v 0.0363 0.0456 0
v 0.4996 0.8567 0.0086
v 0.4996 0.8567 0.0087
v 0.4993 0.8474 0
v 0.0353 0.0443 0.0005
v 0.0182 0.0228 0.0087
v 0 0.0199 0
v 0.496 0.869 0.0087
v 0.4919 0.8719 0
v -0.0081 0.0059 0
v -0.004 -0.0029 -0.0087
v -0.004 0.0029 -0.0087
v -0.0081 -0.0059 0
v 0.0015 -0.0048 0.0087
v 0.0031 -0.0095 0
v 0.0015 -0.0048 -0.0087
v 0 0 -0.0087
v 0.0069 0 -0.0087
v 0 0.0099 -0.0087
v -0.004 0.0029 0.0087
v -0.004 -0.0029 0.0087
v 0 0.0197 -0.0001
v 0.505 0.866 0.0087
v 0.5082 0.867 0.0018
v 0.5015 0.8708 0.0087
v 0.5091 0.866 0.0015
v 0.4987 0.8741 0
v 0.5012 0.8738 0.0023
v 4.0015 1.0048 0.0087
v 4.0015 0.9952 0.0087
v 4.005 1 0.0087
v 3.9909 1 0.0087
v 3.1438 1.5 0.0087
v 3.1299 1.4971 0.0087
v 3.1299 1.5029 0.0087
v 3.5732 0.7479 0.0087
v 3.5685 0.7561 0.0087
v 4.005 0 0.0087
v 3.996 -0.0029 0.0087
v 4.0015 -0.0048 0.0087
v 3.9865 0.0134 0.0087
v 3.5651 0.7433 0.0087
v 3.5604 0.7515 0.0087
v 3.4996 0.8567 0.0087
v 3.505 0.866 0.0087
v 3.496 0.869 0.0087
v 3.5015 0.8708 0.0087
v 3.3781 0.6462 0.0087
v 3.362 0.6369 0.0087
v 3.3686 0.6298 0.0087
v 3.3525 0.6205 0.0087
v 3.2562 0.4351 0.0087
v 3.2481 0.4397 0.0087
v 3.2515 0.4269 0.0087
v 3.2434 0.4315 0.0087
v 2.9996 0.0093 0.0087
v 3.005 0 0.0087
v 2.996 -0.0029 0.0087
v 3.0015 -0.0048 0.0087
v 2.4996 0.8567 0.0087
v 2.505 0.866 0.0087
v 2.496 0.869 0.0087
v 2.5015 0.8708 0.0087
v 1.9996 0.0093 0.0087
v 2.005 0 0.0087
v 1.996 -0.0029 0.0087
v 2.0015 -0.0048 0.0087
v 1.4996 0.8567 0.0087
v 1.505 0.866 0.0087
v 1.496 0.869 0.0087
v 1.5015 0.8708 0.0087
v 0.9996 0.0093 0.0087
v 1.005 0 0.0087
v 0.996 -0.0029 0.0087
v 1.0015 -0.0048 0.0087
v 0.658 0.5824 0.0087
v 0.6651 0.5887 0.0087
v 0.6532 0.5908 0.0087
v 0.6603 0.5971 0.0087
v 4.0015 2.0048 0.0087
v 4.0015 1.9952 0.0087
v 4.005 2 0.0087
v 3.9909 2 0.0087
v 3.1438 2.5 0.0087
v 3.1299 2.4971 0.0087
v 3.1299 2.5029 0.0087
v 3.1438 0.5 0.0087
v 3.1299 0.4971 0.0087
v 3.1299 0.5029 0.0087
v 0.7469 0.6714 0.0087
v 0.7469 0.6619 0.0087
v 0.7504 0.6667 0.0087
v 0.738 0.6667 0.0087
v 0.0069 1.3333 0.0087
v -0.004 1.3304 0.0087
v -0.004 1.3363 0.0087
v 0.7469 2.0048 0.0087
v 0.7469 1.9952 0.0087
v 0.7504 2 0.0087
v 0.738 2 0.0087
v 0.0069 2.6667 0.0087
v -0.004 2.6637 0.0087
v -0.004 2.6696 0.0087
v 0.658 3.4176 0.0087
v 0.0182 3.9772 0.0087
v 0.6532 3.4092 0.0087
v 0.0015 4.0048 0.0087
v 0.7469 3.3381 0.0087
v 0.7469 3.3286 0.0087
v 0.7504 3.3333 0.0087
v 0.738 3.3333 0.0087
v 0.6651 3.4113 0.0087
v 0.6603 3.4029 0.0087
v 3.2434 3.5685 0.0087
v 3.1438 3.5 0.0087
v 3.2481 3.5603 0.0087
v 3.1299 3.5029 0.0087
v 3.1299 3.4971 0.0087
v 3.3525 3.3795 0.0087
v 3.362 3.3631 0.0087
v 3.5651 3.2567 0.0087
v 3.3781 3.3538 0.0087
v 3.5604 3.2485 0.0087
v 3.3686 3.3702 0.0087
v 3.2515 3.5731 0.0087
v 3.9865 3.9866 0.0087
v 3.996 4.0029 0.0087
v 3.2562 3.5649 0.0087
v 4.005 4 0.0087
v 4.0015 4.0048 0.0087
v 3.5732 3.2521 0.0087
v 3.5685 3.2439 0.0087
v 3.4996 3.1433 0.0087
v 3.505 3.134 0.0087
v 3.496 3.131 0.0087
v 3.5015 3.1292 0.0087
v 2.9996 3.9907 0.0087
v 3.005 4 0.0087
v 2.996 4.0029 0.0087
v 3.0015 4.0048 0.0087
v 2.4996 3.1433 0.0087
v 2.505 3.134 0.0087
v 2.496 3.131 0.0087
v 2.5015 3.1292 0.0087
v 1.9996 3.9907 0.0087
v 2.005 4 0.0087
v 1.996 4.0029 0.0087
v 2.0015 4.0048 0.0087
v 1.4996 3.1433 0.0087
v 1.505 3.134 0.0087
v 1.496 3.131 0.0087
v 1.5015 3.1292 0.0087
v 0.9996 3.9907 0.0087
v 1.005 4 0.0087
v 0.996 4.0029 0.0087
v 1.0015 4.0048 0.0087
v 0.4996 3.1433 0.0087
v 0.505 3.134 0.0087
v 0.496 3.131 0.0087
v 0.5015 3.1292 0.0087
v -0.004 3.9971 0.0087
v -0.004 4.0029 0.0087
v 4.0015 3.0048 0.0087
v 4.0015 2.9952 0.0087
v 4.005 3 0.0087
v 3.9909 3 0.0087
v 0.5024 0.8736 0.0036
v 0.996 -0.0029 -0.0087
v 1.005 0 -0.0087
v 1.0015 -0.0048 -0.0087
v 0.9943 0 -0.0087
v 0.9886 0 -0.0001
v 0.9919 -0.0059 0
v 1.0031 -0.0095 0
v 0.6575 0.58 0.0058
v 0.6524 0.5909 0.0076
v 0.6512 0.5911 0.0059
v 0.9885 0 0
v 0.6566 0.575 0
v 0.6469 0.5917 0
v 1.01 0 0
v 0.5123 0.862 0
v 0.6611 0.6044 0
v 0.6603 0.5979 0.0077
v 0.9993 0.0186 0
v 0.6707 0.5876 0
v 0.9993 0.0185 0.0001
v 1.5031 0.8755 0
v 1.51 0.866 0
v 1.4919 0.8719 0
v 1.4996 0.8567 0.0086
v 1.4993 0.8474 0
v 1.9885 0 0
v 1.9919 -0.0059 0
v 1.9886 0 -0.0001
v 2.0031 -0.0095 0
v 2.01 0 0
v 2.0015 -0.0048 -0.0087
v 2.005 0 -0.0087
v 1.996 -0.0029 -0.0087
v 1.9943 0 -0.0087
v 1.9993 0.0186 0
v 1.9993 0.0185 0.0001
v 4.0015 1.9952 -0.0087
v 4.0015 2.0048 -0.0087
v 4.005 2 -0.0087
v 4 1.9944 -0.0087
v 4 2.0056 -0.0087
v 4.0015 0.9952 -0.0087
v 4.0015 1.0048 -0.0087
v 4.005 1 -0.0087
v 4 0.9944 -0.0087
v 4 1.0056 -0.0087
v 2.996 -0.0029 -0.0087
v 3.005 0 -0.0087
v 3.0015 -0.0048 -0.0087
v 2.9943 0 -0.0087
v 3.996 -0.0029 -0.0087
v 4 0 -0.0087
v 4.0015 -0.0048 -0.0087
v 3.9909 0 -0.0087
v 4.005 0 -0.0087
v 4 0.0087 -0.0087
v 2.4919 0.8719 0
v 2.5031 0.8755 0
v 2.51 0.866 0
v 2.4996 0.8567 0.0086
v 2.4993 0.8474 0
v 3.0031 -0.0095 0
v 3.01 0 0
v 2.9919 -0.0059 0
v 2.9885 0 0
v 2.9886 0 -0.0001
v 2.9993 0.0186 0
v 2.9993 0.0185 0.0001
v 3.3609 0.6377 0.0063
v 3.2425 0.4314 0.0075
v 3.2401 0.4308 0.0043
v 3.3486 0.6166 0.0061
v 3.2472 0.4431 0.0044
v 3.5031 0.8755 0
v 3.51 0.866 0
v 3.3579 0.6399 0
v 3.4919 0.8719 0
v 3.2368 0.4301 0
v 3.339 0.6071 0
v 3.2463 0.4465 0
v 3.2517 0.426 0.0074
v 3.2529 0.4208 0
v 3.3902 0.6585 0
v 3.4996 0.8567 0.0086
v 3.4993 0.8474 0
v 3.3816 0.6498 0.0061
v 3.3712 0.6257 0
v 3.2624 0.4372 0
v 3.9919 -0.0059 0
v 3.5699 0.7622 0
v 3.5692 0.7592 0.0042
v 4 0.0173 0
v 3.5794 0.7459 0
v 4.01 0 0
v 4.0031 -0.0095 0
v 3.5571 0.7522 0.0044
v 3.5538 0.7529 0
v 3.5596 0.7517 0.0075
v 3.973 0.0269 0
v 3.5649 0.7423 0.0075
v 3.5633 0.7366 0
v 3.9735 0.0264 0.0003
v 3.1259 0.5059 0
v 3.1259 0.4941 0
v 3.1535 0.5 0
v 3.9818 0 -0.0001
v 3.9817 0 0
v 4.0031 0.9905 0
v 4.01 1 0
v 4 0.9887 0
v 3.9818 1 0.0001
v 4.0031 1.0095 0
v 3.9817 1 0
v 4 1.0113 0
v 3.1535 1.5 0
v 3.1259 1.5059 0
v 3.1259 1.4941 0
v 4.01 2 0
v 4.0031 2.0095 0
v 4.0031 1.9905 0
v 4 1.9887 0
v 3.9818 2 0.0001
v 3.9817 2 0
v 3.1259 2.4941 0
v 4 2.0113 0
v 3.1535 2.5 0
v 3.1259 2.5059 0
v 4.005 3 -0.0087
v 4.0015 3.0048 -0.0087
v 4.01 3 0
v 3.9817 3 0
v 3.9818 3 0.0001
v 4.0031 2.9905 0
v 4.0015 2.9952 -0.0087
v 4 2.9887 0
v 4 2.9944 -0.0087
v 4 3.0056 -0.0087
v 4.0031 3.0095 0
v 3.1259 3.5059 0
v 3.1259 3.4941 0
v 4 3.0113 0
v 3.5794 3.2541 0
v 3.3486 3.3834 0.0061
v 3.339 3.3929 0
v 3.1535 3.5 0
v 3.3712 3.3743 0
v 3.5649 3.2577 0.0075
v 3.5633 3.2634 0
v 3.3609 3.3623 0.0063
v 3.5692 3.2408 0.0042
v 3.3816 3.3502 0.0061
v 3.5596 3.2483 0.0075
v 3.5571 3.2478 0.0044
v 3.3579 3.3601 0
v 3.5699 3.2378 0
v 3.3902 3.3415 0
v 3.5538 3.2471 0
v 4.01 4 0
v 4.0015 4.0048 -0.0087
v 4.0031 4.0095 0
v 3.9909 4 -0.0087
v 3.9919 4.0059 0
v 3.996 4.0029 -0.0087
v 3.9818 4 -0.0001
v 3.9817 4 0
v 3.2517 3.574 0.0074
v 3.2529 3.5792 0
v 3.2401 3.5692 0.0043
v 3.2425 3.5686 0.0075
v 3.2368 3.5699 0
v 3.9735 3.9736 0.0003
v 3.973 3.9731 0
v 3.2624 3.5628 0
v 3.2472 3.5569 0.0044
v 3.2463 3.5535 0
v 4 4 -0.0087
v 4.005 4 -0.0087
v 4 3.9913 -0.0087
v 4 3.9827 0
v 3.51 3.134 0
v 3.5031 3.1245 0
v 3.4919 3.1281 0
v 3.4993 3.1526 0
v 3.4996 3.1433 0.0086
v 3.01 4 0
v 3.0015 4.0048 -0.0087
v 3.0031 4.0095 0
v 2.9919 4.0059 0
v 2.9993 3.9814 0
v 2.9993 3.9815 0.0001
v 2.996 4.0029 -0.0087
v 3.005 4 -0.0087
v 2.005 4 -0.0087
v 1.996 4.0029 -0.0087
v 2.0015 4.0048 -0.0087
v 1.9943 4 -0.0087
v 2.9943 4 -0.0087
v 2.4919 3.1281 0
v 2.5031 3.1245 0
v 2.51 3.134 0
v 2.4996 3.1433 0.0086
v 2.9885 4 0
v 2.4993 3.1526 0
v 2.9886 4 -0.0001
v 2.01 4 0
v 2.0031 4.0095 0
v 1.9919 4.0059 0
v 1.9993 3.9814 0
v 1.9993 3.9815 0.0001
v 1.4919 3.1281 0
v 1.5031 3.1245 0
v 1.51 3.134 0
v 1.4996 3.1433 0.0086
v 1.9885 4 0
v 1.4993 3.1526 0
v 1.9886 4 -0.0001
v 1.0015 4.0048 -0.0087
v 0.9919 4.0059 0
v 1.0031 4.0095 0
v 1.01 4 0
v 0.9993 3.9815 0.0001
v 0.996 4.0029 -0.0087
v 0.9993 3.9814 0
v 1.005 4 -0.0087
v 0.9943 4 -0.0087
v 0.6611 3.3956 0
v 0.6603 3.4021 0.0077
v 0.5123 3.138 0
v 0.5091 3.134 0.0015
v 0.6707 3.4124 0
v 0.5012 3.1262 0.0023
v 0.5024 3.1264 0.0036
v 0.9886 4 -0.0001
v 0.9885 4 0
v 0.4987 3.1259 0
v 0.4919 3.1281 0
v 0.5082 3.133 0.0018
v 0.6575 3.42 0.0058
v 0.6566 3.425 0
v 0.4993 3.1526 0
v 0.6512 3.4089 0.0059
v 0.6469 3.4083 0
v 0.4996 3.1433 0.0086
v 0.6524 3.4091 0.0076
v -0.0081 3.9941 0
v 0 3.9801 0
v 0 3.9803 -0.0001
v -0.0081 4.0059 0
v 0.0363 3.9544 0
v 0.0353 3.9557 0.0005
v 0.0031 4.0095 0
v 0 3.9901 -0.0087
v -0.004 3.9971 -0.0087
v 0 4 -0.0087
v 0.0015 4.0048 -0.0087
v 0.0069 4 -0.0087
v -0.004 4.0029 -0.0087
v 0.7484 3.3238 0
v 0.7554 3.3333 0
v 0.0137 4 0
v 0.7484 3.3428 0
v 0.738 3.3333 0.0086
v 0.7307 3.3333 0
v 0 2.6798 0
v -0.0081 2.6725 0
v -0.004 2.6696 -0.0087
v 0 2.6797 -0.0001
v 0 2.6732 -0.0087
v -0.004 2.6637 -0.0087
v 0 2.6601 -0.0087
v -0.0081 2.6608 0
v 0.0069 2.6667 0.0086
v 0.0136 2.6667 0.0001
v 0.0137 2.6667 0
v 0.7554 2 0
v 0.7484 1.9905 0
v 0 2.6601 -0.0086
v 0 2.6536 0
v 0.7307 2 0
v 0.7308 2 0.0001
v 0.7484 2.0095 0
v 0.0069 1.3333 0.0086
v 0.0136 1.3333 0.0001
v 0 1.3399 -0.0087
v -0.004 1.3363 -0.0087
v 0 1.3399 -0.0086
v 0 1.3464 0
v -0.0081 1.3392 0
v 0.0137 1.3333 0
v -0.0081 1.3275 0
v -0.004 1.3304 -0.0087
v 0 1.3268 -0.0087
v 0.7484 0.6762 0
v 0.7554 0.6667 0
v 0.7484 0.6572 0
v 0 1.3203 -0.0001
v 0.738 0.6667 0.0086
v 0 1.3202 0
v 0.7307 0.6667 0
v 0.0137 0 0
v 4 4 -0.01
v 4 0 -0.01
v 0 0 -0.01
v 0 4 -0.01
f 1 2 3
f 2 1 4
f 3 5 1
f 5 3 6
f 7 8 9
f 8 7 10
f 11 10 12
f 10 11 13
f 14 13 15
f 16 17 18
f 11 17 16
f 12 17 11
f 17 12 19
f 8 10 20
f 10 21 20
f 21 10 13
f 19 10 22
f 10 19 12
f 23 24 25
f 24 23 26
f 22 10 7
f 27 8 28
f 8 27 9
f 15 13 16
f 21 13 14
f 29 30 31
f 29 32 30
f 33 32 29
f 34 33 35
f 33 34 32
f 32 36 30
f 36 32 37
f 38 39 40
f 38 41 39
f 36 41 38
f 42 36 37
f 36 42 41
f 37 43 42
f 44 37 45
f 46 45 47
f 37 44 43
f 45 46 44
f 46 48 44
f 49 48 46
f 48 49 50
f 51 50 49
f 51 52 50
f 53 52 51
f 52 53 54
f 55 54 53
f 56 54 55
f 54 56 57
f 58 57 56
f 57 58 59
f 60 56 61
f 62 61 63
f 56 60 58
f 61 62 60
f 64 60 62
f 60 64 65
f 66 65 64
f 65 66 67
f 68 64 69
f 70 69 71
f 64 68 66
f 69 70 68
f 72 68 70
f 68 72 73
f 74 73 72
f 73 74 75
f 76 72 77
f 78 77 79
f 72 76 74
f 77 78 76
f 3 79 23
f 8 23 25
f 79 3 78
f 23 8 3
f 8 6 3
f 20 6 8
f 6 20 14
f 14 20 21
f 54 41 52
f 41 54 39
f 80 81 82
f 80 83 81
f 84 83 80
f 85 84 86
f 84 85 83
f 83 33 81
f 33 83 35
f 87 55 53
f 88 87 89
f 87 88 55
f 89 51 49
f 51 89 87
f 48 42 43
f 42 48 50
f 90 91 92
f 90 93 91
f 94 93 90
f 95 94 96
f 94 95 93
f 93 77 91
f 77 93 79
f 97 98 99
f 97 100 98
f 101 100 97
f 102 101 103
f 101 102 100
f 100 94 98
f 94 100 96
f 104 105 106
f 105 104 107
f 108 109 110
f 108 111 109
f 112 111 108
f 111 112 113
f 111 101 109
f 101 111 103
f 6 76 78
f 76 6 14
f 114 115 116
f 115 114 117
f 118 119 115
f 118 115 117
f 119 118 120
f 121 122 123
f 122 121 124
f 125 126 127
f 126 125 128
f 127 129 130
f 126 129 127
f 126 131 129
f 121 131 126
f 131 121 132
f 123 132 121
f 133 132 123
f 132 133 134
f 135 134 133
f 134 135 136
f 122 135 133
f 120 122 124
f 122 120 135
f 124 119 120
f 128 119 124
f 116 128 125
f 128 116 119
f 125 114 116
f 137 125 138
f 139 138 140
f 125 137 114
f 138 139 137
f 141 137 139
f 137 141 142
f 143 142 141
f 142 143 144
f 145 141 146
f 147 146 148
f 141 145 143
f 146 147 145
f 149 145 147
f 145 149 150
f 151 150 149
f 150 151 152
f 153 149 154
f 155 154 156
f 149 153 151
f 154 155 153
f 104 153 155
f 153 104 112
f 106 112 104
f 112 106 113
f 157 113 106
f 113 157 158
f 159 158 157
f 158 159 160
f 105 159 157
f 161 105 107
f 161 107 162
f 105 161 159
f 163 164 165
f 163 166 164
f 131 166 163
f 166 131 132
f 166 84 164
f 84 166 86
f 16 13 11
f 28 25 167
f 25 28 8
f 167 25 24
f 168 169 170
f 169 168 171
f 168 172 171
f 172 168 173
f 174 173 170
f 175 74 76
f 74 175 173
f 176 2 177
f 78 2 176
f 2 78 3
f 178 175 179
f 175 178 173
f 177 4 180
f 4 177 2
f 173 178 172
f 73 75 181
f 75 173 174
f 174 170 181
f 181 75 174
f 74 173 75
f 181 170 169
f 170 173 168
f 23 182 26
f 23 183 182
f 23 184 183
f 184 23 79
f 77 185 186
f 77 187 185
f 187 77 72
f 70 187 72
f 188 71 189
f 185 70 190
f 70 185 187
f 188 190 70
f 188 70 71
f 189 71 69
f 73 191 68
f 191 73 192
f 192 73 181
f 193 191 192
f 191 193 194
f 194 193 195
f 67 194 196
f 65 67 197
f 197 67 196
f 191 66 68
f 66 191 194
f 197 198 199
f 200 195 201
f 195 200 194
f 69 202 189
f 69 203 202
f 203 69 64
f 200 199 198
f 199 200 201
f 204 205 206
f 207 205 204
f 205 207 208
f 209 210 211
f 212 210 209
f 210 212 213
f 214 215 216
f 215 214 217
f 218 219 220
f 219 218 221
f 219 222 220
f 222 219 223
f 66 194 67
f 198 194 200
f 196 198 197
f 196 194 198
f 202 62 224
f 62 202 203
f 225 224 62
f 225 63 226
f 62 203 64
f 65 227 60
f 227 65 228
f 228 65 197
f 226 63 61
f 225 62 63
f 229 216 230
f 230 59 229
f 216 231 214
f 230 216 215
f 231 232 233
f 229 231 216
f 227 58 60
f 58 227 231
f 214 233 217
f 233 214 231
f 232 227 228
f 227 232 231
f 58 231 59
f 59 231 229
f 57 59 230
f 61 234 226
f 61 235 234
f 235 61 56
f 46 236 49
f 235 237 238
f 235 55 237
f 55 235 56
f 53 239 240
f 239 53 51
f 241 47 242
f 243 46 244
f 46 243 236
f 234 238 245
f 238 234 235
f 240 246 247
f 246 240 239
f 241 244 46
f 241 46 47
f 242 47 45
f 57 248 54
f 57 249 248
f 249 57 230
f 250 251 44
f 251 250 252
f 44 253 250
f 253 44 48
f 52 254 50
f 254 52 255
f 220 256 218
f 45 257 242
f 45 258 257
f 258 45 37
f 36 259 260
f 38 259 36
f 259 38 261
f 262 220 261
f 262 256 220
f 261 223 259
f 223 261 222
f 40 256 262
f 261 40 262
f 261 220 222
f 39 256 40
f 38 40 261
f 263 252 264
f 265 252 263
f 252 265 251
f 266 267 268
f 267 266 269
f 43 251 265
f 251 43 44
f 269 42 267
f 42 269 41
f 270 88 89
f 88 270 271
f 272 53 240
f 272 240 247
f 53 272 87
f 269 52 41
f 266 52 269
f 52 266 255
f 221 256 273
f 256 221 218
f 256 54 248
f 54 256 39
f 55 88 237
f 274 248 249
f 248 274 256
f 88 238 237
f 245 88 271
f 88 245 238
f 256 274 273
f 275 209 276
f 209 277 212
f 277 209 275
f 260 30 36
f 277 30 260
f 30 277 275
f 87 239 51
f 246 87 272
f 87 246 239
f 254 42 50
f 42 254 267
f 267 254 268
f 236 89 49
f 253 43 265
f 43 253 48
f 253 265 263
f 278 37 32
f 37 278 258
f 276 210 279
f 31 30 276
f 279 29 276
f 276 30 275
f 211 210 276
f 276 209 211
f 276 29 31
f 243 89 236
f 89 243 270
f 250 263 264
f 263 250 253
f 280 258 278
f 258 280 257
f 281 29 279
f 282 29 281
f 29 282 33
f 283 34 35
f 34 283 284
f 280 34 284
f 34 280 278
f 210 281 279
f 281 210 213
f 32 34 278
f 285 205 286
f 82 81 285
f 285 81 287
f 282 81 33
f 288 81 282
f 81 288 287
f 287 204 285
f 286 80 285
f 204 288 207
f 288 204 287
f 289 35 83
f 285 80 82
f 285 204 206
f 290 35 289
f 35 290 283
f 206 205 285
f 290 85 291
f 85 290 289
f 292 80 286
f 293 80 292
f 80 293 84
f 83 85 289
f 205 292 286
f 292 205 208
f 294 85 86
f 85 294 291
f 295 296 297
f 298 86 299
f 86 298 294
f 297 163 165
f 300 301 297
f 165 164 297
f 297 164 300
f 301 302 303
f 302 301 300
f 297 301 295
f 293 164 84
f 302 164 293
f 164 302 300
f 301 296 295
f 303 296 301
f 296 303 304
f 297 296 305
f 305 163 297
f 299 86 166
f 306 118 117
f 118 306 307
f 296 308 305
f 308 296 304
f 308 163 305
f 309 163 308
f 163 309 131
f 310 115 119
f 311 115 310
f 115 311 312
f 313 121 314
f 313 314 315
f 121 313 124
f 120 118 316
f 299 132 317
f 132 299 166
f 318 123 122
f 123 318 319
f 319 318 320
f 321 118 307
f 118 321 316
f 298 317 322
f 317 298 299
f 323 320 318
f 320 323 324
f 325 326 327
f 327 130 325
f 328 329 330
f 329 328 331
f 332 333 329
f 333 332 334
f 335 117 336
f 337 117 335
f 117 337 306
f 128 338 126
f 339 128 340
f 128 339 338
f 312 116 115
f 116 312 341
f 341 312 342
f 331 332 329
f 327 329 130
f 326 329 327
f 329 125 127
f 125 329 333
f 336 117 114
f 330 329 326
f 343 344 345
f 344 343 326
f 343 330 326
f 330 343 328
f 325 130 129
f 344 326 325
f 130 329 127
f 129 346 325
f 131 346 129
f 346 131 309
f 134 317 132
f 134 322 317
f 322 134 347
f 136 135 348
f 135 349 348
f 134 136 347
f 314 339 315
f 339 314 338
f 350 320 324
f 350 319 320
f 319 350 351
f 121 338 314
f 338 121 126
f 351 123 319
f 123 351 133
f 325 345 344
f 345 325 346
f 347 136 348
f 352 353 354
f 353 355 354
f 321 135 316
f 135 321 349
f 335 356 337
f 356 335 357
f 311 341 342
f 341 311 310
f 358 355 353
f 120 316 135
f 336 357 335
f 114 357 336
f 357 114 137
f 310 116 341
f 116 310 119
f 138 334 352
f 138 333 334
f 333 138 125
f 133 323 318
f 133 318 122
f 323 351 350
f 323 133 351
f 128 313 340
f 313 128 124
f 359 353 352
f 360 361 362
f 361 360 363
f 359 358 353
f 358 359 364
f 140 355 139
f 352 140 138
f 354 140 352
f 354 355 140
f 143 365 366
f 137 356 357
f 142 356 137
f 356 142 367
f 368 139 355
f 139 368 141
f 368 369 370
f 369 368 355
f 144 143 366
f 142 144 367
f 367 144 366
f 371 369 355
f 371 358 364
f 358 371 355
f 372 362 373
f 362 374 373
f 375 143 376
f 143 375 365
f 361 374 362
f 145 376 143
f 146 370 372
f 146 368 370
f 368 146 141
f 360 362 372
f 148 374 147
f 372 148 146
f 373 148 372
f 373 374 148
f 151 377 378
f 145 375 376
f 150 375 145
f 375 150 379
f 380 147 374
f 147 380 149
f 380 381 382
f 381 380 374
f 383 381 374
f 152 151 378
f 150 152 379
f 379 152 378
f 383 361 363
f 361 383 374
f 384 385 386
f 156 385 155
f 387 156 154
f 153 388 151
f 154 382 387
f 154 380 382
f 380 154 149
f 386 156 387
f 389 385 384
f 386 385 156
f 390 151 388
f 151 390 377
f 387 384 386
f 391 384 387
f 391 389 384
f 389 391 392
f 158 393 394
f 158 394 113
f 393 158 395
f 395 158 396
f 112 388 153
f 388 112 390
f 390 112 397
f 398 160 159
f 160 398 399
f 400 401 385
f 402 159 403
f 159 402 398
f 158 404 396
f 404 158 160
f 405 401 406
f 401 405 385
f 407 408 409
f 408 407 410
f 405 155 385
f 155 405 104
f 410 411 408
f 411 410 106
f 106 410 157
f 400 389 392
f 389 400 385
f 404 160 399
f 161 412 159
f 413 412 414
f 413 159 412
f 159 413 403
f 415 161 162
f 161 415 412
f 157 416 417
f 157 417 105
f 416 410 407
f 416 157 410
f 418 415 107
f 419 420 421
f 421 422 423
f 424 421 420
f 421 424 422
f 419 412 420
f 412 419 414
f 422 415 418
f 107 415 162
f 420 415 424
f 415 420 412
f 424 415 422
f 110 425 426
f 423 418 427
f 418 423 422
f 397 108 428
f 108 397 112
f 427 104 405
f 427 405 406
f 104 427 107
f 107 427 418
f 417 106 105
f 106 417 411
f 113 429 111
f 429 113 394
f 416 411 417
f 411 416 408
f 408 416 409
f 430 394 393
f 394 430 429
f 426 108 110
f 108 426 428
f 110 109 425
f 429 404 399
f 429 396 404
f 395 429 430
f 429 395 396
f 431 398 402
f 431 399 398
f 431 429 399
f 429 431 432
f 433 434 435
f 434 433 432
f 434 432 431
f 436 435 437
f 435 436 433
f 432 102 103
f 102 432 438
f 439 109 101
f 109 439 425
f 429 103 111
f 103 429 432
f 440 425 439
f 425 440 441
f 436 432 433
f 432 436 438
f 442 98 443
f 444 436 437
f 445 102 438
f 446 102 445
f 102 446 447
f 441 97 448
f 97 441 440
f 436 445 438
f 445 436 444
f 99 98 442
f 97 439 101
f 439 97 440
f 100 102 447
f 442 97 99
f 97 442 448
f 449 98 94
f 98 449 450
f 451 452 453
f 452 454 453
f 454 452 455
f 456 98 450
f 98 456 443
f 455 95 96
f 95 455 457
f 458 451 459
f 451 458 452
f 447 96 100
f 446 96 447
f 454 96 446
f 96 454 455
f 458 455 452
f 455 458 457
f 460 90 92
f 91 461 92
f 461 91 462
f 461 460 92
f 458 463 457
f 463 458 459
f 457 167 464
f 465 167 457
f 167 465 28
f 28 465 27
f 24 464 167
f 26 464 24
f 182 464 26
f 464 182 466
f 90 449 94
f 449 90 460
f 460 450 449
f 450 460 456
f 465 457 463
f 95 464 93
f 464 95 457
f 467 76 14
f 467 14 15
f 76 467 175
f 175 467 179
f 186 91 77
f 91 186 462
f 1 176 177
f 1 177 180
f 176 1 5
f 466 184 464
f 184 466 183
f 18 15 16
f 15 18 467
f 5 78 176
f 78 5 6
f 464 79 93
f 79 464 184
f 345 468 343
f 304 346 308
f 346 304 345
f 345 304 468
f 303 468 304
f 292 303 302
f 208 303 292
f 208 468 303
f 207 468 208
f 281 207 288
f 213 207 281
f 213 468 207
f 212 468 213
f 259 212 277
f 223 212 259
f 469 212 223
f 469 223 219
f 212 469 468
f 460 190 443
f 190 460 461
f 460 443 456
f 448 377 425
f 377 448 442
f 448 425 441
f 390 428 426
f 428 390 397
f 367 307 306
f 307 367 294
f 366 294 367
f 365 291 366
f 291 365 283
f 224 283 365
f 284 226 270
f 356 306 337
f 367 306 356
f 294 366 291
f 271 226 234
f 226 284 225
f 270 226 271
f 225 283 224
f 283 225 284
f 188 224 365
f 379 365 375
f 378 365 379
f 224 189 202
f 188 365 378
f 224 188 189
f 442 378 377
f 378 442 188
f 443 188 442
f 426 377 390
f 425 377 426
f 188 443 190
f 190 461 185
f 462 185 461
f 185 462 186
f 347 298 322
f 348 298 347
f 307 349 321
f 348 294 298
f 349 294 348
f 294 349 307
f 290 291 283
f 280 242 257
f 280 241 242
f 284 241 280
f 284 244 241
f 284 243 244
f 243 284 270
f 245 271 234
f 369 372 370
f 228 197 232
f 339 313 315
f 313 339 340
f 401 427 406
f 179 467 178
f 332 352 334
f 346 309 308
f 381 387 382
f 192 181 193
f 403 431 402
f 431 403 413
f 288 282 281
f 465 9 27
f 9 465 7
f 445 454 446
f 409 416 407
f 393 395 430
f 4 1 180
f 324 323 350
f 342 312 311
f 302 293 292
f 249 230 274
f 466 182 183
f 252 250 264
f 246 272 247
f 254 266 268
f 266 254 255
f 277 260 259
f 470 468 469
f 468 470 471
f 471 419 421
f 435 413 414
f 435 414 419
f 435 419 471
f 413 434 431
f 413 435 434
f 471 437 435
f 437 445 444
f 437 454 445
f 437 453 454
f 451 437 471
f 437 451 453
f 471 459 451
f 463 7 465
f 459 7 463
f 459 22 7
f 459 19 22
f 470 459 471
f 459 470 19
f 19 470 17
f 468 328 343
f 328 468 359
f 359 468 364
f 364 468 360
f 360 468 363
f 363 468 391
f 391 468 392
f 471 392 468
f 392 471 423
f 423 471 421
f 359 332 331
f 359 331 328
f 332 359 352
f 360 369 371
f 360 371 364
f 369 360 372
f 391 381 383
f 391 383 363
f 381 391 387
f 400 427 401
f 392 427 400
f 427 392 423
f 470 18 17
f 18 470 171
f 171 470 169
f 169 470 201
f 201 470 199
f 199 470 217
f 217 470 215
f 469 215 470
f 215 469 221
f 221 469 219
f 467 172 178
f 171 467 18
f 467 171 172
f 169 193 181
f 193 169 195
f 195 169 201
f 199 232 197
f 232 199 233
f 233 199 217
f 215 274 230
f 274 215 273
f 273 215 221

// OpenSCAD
hull(){
    translate([0.0, 0.0]) sphere(0.01);
    translate([0.5, 0.8660254038]) sphere(0.01);
}
hull(){
    translate([0.5, 0.8660254038]) sphere(0.01);
    translate([1.0, 0.0]) sphere(0.01);
}
hull(){
    translate([1.0, 0.0]) sphere(0.01);
    translate([1.5, 0.8660254038]) sphere(0.01);
}
hull(){
    translate([1.5, 0.8660254038]) sphere(0.01);
    translate([2.0, 0.0]) sphere(0.01);
}
hull(){
    translate([2.0, 0.0]) sphere(0.01);
    translate([2.5, 0.8660254038]) sphere(0.01);
}
hull(){
    translate([2.5, 0.8660254038]) sphere(0.01);
    translate([3.0, 0.0]) sphere(0.01);
}
hull(){
    translate([3.0, 0.0]) sphere(0.01);
    translate([3.5, 0.8660254038]) sphere(0.01);
}
hull(){
    translate([3.5, 0.8660254038]) sphere(0.01);
    translate([4.0, 0.0]) sphere(0.01);
}
hull(){
    translate([4.0, 0.0]) sphere(0.01);
    translate([3.1339745962, 0.5]) sphere(0.01);
}
hull(){
    translate([3.1339745962, 0.5]) sphere(0.01);
    translate([4.0, 1.0]) sphere(0.01);
}
hull(){
    translate([4.0, 1.0]) sphere(0.01);
    translate([3.1339745962, 1.5]) sphere(0.01);
}
hull(){
    translate([3.1339745962, 1.5]) sphere(0.01);
    translate([4.0, 2.0]) sphere(0.01);
}
hull(){
    translate([4.0, 2.0]) sphere(0.01);
    translate([3.1339745962, 2.5]) sphere(0.01);
}
hull(){
    translate([3.1339745962, 2.5]) sphere(0.01);
    translate([4.0, 3.0]) sphere(0.01);
}
hull(){
    translate([4.0, 3.0]) sphere(0.01);
    translate([3.1339745962, 3.5]) sphere(0.01);
}
hull(){
    translate([3.1339745962, 3.5]) sphere(0.01);
    translate([4.0, 4.0]) sphere(0.01);
}
hull(){
    translate([4.0, 4.0]) sphere(0.01);
    translate([3.5, 3.1339745962]) sphere(0.01);
}
hull(){
    translate([3.5, 3.1339745962]) sphere(0.01);
    translate([3.0, 4.0]) sphere(0.01);
}
hull(){
    translate([3.0, 4.0]) sphere(0.01);
    translate([2.5, 3.1339745962]) sphere(0.01);
}
hull(){
    translate([2.5, 3.1339745962]) sphere(0.01);
    translate([2.0, 4.0]) sphere(0.01);
}
hull(){
    translate([2.0, 4.0]) sphere(0.01);
    translate([1.5, 3.1339745962]) sphere(0.01);
}
hull(){
    translate([1.5, 3.1339745962]) sphere(0.01);
    translate([1.0, 4.0]) sphere(0.01);
}
hull(){
    translate([1.0, 4.0]) sphere(0.01);
    translate([0.5, 3.1339745962]) sphere(0.01);
}
hull(){
    translate([0.5, 3.1339745962]) sphere(0.01);
    translate([0.0, 4.0]) sphere(0.01);
}
hull(){
    translate([0.0, 4.0]) sphere(0.01);
    translate([0.7453559925, 3.3333333333]) sphere(0.01);
}
hull(){
    translate([0.7453559925, 3.3333333333]) sphere(0.01);
    translate([0.0, 2.6666666667]) sphere(0.01);
}
hull(){
    translate([0.0, 2.6666666667]) sphere(0.01);
    translate([0.7453559925, 2.0]) sphere(0.01);
}
hull(){
    translate([0.7453559925, 2.0]) sphere(0.01);
    translate([0.0, 1.3333333333]) sphere(0.01);
}
hull(){
    translate([0.0, 1.3333333333]) sphere(0.01);
    translate([0.7453559925, 0.6666666667]) sphere(0.01);
}
hull(){
    translate([0.7453559925, 0.6666666667]) sphere(0.01);
    translate([0.0, 0.0]) sphere(0.01);
}
translate([0,0,-0.01]) color([0.1,0.1,0.1]) cube([4,4,0.01]);
